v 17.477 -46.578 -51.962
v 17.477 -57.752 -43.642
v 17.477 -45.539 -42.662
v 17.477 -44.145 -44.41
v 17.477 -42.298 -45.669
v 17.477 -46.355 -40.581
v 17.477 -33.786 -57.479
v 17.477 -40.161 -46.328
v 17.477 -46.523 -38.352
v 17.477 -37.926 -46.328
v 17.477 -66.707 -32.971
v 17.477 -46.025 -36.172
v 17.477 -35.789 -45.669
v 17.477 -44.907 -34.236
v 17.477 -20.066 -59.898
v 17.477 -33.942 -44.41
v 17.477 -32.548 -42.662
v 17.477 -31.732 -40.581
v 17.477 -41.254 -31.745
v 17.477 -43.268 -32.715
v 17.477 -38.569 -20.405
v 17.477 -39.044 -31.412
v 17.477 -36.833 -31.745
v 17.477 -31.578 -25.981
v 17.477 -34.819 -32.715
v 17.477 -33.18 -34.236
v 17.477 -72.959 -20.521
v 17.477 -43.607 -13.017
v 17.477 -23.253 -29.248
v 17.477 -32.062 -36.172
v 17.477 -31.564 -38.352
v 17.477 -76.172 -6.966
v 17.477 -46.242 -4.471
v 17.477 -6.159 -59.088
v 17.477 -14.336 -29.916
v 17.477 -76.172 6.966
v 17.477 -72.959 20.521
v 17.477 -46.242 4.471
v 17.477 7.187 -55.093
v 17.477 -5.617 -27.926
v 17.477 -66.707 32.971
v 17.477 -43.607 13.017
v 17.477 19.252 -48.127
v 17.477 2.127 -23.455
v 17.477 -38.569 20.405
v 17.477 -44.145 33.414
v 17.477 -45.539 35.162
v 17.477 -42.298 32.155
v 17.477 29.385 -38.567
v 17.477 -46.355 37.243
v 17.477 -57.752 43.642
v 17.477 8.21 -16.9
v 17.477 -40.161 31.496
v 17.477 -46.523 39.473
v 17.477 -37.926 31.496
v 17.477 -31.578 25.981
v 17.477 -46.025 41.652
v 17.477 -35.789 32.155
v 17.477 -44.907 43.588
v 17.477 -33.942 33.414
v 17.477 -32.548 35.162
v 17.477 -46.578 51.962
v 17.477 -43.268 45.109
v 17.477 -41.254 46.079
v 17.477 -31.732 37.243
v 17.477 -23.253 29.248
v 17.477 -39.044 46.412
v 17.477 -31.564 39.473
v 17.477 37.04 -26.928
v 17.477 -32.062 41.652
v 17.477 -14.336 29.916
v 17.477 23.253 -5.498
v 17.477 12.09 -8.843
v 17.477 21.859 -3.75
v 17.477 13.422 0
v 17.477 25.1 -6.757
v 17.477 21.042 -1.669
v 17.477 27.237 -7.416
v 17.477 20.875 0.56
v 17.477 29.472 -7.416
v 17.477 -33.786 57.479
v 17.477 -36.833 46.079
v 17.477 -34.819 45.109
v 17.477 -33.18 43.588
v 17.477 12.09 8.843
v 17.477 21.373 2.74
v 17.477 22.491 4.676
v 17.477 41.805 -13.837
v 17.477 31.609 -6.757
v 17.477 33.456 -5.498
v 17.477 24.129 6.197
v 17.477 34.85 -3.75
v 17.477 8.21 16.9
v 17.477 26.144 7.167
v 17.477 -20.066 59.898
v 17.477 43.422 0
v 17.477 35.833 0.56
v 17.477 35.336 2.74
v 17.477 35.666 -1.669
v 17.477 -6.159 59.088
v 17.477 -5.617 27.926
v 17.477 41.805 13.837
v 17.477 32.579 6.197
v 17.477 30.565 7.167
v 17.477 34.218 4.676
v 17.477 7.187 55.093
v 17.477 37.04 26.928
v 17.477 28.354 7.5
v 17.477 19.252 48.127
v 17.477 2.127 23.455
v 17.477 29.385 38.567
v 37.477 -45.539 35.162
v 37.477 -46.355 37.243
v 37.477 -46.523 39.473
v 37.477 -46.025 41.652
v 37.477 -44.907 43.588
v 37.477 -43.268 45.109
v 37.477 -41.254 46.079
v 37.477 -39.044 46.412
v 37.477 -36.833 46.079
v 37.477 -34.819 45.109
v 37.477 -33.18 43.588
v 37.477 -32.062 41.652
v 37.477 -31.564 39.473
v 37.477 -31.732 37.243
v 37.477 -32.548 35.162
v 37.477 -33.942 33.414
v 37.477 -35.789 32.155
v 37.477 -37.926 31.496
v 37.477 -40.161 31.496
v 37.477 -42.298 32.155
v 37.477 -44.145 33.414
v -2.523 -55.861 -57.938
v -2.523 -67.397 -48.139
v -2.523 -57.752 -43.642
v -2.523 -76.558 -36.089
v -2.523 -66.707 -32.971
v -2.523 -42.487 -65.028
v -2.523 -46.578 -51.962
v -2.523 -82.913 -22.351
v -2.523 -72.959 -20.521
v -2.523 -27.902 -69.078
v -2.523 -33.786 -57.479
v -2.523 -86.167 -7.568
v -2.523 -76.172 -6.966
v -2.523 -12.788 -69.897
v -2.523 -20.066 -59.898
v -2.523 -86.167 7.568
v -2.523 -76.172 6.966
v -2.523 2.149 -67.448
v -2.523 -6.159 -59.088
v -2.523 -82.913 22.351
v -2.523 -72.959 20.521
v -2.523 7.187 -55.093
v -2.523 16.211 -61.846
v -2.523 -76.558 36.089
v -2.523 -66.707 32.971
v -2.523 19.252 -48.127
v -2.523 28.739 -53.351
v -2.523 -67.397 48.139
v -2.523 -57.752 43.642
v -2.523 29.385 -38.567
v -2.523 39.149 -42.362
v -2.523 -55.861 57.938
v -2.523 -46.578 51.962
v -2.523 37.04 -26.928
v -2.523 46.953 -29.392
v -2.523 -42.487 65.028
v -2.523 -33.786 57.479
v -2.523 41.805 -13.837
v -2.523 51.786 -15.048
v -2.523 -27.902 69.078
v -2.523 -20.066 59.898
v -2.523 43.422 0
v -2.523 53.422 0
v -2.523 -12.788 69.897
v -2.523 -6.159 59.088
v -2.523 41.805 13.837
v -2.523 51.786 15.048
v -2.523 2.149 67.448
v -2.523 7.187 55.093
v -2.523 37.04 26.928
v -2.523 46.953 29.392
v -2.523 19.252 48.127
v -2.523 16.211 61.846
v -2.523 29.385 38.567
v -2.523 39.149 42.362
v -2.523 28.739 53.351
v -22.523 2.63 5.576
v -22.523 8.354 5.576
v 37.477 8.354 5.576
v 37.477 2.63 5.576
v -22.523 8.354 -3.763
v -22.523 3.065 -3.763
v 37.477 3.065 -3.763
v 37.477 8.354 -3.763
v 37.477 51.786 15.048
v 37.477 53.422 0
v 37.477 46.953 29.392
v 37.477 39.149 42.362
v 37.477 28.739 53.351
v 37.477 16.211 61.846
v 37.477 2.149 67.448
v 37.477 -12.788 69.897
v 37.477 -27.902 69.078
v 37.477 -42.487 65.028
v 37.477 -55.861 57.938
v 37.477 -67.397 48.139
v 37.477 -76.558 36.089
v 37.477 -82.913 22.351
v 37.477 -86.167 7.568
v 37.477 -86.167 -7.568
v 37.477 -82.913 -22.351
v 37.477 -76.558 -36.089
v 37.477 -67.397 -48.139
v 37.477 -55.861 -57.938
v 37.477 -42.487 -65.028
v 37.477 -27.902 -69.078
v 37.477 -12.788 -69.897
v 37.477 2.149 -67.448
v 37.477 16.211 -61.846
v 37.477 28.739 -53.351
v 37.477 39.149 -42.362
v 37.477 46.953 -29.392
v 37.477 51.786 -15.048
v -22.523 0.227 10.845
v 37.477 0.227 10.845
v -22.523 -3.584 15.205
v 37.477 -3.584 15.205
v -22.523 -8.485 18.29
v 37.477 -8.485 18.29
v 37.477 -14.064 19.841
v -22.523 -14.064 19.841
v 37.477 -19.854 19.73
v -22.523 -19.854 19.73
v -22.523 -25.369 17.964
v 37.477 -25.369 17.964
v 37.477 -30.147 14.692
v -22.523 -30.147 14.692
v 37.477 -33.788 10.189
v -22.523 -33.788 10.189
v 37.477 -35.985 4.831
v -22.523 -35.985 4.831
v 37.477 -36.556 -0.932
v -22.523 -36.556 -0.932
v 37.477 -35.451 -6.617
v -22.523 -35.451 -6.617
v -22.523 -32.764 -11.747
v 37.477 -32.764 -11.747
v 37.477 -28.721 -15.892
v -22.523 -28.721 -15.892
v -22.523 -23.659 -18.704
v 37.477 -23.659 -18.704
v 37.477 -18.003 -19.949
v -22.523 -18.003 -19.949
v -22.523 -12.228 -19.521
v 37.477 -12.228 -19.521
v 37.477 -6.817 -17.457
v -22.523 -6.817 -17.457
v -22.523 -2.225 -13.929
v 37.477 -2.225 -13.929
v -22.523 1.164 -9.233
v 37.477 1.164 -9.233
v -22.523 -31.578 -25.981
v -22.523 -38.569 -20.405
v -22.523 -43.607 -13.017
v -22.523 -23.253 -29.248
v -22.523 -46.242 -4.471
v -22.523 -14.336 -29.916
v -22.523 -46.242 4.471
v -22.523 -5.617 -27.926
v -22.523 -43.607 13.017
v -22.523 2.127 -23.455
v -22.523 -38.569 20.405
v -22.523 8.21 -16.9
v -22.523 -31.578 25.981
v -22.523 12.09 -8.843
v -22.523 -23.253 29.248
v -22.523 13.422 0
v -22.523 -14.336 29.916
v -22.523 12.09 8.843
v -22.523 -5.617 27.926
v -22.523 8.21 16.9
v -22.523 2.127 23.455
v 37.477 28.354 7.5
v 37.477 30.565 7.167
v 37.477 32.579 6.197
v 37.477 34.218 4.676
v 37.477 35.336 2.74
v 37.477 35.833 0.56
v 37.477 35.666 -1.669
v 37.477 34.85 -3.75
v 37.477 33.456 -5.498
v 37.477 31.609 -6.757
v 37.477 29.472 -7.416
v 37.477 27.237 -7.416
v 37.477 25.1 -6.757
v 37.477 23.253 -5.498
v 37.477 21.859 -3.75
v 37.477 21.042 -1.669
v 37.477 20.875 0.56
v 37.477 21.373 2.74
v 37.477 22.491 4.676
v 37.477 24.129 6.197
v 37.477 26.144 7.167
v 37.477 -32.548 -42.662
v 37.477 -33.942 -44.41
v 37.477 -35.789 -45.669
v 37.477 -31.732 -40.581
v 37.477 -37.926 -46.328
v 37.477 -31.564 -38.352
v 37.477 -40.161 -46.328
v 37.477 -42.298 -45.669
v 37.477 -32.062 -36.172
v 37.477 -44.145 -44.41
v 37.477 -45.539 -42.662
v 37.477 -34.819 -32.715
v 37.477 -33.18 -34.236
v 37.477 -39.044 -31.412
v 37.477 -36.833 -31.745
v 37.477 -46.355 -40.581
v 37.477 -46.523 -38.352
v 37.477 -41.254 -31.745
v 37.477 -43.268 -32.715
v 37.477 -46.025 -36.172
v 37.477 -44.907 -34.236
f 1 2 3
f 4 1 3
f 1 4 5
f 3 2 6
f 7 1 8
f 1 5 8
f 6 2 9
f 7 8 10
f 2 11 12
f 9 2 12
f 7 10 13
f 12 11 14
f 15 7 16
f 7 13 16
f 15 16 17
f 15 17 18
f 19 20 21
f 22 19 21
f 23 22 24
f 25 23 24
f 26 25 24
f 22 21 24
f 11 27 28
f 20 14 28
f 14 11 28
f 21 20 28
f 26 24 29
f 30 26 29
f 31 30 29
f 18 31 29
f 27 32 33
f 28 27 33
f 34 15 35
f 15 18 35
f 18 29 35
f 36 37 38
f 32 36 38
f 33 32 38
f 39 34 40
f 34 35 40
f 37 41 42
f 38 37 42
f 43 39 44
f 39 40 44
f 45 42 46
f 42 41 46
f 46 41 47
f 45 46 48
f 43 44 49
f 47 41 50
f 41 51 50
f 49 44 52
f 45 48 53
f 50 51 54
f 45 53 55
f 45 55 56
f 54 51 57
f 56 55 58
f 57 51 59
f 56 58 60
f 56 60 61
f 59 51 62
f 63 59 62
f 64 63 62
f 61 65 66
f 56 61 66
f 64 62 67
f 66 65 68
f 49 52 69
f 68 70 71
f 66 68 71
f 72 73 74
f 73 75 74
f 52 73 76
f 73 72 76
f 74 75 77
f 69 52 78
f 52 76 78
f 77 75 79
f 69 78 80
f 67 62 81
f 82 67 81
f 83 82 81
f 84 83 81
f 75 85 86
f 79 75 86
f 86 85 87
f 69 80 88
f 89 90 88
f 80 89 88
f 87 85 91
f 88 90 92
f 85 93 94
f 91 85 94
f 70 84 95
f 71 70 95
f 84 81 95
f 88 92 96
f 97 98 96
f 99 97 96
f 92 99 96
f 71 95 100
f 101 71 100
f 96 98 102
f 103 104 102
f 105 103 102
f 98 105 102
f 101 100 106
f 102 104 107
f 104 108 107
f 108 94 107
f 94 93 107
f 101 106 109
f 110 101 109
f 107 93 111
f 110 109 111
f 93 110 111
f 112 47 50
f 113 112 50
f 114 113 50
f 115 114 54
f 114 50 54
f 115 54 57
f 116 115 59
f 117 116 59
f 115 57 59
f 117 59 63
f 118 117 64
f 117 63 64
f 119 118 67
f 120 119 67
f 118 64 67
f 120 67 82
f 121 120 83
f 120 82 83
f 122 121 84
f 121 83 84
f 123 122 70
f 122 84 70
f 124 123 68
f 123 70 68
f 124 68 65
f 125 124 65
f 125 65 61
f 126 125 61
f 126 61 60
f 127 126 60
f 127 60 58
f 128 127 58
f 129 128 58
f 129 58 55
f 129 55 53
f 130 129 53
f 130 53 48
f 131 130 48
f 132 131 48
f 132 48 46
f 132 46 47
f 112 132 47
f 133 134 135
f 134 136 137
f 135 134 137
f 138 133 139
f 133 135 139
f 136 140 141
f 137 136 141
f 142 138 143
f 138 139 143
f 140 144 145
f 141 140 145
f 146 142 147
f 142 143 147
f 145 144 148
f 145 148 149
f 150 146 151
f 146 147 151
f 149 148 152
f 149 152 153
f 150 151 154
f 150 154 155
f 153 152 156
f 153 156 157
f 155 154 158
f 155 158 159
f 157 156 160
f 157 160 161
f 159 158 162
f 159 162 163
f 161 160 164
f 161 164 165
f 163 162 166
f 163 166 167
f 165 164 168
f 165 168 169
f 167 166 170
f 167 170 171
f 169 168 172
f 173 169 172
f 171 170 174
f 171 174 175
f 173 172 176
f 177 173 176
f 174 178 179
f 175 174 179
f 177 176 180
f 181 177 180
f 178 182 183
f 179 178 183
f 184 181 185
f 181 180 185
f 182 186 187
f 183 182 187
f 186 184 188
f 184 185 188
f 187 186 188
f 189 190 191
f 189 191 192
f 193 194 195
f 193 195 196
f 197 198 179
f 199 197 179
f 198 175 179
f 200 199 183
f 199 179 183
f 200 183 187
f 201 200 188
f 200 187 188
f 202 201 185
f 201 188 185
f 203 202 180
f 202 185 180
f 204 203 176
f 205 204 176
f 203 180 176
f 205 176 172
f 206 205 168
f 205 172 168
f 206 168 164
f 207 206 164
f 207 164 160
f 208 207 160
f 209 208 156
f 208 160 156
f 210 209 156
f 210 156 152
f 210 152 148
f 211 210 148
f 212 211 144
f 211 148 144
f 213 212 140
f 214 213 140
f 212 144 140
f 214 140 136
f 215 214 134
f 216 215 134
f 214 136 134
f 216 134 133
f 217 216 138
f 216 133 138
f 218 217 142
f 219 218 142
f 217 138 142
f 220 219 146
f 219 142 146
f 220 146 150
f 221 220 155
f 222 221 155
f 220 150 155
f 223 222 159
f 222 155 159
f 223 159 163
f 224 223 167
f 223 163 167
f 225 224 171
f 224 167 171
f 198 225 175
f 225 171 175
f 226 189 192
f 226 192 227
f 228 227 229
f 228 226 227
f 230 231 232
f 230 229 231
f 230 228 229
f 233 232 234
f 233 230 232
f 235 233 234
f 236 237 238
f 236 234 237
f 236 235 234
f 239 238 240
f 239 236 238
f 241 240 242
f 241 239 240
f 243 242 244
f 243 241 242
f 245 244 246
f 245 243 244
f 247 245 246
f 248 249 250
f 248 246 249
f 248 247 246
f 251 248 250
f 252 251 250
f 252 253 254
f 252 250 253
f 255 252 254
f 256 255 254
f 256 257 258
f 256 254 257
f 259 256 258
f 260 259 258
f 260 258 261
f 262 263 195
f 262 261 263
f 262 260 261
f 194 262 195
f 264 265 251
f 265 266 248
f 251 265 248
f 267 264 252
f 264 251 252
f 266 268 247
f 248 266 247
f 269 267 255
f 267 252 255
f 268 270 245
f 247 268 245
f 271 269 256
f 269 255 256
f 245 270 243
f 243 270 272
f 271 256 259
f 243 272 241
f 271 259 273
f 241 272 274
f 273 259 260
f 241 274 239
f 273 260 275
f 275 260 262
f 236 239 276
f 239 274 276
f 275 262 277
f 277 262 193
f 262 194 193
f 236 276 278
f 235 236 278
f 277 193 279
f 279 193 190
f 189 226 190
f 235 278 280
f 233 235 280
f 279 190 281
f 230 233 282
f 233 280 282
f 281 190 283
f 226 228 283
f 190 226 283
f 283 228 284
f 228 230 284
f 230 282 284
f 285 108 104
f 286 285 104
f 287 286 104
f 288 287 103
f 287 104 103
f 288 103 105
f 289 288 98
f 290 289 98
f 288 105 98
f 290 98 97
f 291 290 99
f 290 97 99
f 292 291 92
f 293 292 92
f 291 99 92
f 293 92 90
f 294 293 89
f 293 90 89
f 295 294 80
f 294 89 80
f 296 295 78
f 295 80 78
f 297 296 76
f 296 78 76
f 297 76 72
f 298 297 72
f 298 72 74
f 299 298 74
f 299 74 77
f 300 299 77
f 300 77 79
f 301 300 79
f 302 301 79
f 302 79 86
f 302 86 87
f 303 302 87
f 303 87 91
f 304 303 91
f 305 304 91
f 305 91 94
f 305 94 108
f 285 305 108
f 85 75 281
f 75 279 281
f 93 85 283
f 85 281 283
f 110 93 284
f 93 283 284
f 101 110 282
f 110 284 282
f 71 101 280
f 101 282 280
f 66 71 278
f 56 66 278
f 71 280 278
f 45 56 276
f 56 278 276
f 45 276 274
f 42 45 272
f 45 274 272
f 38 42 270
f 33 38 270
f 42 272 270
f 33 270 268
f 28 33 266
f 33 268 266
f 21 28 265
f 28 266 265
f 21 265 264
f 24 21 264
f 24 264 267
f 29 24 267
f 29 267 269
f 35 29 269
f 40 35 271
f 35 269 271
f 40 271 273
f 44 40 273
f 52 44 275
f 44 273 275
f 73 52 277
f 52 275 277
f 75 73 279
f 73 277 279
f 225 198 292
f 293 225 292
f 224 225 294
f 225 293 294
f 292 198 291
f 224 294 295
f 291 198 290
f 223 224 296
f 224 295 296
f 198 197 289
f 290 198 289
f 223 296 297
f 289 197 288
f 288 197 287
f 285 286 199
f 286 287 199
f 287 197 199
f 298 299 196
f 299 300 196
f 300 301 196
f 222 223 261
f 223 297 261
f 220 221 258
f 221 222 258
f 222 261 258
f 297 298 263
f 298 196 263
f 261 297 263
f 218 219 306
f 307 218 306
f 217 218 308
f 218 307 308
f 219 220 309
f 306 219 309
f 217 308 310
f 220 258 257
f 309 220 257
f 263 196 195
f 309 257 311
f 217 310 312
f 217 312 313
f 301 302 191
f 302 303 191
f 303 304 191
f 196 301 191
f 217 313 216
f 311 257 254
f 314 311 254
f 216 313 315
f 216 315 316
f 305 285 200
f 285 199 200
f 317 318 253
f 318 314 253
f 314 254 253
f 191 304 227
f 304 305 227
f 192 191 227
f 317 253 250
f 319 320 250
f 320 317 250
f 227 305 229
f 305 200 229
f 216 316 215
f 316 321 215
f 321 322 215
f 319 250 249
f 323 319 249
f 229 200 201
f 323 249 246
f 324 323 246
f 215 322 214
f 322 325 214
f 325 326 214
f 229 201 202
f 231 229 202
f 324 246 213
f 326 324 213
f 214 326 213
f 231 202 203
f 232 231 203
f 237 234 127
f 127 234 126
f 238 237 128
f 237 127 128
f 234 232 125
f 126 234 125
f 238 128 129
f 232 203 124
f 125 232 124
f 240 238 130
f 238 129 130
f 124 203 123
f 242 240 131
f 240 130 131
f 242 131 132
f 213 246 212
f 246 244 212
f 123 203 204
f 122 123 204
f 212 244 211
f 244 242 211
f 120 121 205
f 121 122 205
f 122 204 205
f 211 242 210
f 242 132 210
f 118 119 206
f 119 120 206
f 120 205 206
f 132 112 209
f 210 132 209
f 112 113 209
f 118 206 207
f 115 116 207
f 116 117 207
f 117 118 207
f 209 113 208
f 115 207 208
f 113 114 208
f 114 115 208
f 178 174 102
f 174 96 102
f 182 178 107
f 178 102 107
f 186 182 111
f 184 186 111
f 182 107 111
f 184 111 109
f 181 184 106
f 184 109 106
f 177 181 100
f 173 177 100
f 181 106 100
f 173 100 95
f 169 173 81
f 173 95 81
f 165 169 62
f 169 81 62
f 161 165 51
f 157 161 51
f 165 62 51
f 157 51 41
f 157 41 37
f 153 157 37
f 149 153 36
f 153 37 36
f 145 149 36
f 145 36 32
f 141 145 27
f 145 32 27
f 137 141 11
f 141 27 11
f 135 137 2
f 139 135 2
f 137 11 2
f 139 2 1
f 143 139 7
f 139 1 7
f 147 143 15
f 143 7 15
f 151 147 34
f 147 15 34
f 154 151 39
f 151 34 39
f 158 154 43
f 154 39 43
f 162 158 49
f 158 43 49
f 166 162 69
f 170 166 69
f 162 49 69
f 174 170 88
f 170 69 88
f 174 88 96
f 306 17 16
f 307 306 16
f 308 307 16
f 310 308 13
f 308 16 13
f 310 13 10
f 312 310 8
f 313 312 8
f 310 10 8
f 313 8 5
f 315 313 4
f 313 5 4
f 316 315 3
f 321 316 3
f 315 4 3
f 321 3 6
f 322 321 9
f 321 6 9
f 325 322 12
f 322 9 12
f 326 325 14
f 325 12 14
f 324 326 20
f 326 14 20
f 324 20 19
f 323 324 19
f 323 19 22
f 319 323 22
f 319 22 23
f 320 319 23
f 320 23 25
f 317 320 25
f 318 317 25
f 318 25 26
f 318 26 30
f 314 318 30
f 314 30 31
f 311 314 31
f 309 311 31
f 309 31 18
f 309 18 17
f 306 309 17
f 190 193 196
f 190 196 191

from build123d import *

# Parameters (mm, degrees)
CUT_EXTRUDE1_DEPTH = 61
SKETCH3_R          = 7.5
CUT_EXTRUDE2_DEPTH = 21
CIRPATTERN1_COUNT  = 3


with BuildPart() as part:
    # Sketch1 → Revolve1 (revolve)
    with BuildSketch(Plane.XY):
        Polygon((-22.523252325, 13.422459893), (-22.523252325, -16.577540107), (37.476747675, -16.577540107), (37.476747675, 53.422459893), (-2.523252325, 53.422459893), (-2.523252325, 43.422459893), (17.476747675, 43.422459893), (17.476747675, 13.422459893), align=None)
    revolve(axis=Axis((-22.523252325, -16.577540107, 0), (1, 0, 0)))

    # Sketch2 → Cut-Extrude1 (cut, through all)
    with BuildSketch(Plane.ZY.offset(22.523252325)):
        with BuildLine():
            Line((-3.763166571, 3.06523407), (-3.763166571, 8.354397525))
            Line((-3.763166571, 8.354397525), (5.575592602, 8.354397525))
            Line((5.575592602, 8.354397525), (5.575592602, 2.62956189))
            ThreePointArc((5.575592602, 2.62956189), (-0.932027141, -36.555811439), (-3.763166571, 3.06523407))
        make_face()
    extrude(amount=-CUT_EXTRUDE1_DEPTH, mode=Mode.SUBTRACT)

    # Sketch3 → Cut-Extrude2 (cut, through all)
    with BuildSketch(Plane.ZY.offset(-17.476747675)):
        with Locations((0, 28.354397525)):
            Circle(SKETCH3_R)
    cut_extrude2 = extrude(amount=-CUT_EXTRUDE2_DEPTH, mode=Mode.SUBTRACT)

    # CirPattern1: Cut-Extrude2 ×3 about axis
    cirpattern1_axis = Axis((0, -16.577540107, 0), (1, 0, 0))
    for i in range(1, CIRPATTERN1_COUNT):
        add(cut_extrude2.rotate(cirpattern1_axis, i * 360 / CIRPATTERN1_COUNT), mode=Mode.SUBTRACT)


solid = part.part
